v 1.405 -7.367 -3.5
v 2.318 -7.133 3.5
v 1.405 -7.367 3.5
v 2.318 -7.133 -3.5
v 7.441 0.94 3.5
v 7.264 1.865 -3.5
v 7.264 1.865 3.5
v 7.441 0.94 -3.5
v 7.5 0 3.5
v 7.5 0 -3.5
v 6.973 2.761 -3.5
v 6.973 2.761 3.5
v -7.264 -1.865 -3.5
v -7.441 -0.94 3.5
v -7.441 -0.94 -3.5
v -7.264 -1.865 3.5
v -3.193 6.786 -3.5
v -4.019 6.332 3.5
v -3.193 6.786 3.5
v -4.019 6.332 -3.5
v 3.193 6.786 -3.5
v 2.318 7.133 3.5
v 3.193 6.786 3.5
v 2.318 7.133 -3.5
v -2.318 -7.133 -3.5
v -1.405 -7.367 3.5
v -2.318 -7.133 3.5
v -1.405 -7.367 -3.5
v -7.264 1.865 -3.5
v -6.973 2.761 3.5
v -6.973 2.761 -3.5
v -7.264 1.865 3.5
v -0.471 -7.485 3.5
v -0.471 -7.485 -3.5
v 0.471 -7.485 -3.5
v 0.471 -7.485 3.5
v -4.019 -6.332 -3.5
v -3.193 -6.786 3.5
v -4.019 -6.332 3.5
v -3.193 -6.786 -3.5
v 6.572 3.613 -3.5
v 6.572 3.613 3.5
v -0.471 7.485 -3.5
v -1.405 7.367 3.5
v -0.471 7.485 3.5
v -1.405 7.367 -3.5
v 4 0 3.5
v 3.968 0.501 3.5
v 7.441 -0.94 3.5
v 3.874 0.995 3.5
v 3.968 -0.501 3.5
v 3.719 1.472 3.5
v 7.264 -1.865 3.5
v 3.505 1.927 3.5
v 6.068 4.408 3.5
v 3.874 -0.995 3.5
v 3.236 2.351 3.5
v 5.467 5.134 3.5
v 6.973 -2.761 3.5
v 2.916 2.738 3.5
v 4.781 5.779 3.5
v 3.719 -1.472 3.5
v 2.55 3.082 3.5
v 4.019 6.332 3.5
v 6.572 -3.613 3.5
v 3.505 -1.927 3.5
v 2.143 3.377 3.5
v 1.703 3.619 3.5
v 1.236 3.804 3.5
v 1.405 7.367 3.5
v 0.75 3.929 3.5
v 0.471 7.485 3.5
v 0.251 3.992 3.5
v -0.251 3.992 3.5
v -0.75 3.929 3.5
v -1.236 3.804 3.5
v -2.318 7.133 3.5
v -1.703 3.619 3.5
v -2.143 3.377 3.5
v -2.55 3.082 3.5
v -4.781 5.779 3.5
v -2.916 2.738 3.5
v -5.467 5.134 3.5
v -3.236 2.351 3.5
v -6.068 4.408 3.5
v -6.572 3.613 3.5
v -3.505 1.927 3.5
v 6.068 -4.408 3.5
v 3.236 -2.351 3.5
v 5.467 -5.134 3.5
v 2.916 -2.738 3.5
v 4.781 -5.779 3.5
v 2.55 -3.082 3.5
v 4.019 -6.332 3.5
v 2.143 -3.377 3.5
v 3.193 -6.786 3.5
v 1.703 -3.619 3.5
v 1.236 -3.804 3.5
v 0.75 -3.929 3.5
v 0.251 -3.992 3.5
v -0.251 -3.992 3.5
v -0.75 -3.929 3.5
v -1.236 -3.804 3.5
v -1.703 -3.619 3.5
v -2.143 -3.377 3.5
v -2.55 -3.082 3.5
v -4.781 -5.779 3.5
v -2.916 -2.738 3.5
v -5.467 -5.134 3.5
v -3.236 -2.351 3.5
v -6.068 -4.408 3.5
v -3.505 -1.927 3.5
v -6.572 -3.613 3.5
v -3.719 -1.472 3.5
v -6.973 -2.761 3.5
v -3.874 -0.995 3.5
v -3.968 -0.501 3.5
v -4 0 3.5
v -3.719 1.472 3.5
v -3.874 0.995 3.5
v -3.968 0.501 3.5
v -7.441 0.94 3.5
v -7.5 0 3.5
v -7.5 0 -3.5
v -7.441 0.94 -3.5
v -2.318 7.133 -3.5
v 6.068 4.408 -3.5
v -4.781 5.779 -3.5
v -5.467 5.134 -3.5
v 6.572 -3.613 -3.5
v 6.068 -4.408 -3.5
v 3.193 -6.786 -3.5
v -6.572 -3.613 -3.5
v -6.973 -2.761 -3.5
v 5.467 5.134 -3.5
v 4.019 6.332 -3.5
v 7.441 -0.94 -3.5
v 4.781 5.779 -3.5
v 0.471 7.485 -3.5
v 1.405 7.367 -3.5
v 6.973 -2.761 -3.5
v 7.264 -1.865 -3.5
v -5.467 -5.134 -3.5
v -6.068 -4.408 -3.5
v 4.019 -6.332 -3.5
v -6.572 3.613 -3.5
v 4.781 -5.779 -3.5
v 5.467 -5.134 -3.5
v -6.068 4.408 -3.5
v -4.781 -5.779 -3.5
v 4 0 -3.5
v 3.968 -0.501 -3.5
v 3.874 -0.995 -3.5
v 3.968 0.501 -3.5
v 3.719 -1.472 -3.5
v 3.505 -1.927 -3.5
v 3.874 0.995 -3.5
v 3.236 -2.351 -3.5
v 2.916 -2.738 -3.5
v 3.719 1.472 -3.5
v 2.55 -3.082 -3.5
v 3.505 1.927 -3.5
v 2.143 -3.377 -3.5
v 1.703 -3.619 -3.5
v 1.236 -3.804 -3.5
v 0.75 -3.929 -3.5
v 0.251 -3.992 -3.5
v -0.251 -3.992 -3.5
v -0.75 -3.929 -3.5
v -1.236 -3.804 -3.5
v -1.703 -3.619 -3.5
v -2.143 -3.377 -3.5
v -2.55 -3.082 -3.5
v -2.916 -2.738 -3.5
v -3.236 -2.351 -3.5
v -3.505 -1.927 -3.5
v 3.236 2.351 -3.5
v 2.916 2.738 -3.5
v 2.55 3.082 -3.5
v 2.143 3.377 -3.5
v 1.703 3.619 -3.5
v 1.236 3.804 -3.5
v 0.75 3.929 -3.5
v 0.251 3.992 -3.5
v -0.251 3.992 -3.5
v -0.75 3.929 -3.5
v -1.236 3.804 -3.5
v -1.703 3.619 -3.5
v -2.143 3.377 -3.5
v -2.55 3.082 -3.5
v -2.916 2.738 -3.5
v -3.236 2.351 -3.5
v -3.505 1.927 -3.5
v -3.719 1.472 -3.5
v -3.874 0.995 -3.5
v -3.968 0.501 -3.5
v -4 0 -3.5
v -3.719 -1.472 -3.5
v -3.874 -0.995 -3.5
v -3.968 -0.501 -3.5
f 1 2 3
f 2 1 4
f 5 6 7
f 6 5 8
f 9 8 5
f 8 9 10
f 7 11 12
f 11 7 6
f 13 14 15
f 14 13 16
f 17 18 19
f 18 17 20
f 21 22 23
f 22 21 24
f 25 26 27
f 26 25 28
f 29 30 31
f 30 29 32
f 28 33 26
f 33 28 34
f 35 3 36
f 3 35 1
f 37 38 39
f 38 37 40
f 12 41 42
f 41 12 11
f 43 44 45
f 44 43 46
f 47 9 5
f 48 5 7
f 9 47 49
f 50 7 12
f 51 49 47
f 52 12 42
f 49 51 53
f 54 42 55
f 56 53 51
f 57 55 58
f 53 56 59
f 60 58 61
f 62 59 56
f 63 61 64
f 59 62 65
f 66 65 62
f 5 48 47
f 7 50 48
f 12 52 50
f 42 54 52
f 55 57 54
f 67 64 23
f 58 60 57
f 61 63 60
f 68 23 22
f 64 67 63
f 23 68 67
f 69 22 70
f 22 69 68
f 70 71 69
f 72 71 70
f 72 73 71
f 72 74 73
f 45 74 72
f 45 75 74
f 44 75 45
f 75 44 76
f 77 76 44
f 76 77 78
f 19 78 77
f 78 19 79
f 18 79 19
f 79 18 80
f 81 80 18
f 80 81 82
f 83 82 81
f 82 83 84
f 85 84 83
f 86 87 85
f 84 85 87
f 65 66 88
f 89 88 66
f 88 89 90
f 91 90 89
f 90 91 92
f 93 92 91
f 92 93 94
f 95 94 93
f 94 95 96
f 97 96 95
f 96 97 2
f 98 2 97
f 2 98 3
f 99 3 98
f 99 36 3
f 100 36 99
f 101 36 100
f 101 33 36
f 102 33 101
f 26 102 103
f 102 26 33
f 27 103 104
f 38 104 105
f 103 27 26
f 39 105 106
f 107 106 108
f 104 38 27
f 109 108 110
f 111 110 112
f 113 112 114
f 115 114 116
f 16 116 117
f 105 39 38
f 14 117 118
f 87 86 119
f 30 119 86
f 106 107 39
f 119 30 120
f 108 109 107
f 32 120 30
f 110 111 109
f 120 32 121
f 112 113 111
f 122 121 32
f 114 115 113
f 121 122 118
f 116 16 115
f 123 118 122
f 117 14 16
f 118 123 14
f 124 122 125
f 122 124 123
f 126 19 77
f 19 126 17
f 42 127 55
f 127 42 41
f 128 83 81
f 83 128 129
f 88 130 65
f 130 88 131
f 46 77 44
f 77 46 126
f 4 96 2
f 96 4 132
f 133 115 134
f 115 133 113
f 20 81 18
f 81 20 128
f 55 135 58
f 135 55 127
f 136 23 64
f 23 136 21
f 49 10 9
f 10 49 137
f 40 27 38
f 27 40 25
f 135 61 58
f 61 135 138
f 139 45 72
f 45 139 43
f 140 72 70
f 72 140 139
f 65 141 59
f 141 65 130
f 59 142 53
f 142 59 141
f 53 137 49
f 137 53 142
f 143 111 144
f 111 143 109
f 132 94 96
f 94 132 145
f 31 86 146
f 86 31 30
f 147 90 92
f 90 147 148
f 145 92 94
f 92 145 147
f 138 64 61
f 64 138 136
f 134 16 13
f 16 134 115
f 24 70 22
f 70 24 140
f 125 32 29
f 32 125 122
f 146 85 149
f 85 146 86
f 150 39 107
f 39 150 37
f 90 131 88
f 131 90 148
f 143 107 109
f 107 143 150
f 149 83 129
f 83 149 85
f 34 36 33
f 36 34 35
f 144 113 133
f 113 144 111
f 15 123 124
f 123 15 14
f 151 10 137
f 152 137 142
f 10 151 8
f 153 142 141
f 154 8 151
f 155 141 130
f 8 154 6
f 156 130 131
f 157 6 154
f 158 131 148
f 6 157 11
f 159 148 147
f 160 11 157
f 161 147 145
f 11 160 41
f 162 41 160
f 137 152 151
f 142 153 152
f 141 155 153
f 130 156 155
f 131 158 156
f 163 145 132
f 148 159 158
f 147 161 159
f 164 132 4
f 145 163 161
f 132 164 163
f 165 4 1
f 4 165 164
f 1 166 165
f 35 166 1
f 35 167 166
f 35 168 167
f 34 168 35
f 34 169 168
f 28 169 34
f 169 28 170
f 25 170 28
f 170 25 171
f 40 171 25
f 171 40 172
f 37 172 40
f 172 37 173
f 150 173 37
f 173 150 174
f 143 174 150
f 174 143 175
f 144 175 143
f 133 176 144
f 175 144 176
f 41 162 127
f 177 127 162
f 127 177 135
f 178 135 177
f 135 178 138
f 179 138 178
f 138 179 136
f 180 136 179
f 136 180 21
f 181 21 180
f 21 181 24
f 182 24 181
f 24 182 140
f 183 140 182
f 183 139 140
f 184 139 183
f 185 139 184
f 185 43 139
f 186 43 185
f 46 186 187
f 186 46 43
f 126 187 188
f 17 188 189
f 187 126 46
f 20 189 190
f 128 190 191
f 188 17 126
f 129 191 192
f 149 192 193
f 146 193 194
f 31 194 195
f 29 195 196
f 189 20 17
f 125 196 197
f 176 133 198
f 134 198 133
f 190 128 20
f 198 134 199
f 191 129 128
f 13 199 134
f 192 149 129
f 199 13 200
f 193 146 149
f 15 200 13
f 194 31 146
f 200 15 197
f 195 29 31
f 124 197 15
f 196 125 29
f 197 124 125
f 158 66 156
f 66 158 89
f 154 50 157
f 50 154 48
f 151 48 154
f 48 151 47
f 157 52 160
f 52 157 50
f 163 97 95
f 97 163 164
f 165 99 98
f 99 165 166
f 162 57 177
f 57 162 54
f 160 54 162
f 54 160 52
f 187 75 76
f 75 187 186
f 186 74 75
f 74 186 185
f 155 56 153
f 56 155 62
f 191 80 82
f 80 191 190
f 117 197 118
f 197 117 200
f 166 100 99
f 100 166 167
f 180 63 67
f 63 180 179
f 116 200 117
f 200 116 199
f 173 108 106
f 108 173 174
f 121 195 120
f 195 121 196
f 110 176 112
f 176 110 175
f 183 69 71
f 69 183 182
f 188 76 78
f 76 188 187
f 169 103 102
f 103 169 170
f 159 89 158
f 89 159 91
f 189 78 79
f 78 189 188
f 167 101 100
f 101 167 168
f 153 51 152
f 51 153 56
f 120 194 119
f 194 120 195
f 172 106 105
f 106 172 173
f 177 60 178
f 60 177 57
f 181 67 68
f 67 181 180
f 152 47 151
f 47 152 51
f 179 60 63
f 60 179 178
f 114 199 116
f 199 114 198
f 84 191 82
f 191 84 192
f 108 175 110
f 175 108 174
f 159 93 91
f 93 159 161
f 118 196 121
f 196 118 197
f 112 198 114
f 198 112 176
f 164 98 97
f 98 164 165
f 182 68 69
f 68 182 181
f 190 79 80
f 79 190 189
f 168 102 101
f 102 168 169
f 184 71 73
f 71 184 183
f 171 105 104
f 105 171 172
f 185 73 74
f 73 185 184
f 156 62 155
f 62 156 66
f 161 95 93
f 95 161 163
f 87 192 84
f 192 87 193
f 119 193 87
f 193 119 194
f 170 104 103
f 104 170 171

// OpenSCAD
$fn = 50;


difference() {
	union() {
		translate(v = [0, 0, -3.5000000000]) {
			cylinder(h = 7, r = 7.5000000000);
		}
	}
	union() {
		translate(v = [0, 0, -100.0000000000]) {
			cylinder(h = 200, r = 4.0000000000);
		}
	}
}
